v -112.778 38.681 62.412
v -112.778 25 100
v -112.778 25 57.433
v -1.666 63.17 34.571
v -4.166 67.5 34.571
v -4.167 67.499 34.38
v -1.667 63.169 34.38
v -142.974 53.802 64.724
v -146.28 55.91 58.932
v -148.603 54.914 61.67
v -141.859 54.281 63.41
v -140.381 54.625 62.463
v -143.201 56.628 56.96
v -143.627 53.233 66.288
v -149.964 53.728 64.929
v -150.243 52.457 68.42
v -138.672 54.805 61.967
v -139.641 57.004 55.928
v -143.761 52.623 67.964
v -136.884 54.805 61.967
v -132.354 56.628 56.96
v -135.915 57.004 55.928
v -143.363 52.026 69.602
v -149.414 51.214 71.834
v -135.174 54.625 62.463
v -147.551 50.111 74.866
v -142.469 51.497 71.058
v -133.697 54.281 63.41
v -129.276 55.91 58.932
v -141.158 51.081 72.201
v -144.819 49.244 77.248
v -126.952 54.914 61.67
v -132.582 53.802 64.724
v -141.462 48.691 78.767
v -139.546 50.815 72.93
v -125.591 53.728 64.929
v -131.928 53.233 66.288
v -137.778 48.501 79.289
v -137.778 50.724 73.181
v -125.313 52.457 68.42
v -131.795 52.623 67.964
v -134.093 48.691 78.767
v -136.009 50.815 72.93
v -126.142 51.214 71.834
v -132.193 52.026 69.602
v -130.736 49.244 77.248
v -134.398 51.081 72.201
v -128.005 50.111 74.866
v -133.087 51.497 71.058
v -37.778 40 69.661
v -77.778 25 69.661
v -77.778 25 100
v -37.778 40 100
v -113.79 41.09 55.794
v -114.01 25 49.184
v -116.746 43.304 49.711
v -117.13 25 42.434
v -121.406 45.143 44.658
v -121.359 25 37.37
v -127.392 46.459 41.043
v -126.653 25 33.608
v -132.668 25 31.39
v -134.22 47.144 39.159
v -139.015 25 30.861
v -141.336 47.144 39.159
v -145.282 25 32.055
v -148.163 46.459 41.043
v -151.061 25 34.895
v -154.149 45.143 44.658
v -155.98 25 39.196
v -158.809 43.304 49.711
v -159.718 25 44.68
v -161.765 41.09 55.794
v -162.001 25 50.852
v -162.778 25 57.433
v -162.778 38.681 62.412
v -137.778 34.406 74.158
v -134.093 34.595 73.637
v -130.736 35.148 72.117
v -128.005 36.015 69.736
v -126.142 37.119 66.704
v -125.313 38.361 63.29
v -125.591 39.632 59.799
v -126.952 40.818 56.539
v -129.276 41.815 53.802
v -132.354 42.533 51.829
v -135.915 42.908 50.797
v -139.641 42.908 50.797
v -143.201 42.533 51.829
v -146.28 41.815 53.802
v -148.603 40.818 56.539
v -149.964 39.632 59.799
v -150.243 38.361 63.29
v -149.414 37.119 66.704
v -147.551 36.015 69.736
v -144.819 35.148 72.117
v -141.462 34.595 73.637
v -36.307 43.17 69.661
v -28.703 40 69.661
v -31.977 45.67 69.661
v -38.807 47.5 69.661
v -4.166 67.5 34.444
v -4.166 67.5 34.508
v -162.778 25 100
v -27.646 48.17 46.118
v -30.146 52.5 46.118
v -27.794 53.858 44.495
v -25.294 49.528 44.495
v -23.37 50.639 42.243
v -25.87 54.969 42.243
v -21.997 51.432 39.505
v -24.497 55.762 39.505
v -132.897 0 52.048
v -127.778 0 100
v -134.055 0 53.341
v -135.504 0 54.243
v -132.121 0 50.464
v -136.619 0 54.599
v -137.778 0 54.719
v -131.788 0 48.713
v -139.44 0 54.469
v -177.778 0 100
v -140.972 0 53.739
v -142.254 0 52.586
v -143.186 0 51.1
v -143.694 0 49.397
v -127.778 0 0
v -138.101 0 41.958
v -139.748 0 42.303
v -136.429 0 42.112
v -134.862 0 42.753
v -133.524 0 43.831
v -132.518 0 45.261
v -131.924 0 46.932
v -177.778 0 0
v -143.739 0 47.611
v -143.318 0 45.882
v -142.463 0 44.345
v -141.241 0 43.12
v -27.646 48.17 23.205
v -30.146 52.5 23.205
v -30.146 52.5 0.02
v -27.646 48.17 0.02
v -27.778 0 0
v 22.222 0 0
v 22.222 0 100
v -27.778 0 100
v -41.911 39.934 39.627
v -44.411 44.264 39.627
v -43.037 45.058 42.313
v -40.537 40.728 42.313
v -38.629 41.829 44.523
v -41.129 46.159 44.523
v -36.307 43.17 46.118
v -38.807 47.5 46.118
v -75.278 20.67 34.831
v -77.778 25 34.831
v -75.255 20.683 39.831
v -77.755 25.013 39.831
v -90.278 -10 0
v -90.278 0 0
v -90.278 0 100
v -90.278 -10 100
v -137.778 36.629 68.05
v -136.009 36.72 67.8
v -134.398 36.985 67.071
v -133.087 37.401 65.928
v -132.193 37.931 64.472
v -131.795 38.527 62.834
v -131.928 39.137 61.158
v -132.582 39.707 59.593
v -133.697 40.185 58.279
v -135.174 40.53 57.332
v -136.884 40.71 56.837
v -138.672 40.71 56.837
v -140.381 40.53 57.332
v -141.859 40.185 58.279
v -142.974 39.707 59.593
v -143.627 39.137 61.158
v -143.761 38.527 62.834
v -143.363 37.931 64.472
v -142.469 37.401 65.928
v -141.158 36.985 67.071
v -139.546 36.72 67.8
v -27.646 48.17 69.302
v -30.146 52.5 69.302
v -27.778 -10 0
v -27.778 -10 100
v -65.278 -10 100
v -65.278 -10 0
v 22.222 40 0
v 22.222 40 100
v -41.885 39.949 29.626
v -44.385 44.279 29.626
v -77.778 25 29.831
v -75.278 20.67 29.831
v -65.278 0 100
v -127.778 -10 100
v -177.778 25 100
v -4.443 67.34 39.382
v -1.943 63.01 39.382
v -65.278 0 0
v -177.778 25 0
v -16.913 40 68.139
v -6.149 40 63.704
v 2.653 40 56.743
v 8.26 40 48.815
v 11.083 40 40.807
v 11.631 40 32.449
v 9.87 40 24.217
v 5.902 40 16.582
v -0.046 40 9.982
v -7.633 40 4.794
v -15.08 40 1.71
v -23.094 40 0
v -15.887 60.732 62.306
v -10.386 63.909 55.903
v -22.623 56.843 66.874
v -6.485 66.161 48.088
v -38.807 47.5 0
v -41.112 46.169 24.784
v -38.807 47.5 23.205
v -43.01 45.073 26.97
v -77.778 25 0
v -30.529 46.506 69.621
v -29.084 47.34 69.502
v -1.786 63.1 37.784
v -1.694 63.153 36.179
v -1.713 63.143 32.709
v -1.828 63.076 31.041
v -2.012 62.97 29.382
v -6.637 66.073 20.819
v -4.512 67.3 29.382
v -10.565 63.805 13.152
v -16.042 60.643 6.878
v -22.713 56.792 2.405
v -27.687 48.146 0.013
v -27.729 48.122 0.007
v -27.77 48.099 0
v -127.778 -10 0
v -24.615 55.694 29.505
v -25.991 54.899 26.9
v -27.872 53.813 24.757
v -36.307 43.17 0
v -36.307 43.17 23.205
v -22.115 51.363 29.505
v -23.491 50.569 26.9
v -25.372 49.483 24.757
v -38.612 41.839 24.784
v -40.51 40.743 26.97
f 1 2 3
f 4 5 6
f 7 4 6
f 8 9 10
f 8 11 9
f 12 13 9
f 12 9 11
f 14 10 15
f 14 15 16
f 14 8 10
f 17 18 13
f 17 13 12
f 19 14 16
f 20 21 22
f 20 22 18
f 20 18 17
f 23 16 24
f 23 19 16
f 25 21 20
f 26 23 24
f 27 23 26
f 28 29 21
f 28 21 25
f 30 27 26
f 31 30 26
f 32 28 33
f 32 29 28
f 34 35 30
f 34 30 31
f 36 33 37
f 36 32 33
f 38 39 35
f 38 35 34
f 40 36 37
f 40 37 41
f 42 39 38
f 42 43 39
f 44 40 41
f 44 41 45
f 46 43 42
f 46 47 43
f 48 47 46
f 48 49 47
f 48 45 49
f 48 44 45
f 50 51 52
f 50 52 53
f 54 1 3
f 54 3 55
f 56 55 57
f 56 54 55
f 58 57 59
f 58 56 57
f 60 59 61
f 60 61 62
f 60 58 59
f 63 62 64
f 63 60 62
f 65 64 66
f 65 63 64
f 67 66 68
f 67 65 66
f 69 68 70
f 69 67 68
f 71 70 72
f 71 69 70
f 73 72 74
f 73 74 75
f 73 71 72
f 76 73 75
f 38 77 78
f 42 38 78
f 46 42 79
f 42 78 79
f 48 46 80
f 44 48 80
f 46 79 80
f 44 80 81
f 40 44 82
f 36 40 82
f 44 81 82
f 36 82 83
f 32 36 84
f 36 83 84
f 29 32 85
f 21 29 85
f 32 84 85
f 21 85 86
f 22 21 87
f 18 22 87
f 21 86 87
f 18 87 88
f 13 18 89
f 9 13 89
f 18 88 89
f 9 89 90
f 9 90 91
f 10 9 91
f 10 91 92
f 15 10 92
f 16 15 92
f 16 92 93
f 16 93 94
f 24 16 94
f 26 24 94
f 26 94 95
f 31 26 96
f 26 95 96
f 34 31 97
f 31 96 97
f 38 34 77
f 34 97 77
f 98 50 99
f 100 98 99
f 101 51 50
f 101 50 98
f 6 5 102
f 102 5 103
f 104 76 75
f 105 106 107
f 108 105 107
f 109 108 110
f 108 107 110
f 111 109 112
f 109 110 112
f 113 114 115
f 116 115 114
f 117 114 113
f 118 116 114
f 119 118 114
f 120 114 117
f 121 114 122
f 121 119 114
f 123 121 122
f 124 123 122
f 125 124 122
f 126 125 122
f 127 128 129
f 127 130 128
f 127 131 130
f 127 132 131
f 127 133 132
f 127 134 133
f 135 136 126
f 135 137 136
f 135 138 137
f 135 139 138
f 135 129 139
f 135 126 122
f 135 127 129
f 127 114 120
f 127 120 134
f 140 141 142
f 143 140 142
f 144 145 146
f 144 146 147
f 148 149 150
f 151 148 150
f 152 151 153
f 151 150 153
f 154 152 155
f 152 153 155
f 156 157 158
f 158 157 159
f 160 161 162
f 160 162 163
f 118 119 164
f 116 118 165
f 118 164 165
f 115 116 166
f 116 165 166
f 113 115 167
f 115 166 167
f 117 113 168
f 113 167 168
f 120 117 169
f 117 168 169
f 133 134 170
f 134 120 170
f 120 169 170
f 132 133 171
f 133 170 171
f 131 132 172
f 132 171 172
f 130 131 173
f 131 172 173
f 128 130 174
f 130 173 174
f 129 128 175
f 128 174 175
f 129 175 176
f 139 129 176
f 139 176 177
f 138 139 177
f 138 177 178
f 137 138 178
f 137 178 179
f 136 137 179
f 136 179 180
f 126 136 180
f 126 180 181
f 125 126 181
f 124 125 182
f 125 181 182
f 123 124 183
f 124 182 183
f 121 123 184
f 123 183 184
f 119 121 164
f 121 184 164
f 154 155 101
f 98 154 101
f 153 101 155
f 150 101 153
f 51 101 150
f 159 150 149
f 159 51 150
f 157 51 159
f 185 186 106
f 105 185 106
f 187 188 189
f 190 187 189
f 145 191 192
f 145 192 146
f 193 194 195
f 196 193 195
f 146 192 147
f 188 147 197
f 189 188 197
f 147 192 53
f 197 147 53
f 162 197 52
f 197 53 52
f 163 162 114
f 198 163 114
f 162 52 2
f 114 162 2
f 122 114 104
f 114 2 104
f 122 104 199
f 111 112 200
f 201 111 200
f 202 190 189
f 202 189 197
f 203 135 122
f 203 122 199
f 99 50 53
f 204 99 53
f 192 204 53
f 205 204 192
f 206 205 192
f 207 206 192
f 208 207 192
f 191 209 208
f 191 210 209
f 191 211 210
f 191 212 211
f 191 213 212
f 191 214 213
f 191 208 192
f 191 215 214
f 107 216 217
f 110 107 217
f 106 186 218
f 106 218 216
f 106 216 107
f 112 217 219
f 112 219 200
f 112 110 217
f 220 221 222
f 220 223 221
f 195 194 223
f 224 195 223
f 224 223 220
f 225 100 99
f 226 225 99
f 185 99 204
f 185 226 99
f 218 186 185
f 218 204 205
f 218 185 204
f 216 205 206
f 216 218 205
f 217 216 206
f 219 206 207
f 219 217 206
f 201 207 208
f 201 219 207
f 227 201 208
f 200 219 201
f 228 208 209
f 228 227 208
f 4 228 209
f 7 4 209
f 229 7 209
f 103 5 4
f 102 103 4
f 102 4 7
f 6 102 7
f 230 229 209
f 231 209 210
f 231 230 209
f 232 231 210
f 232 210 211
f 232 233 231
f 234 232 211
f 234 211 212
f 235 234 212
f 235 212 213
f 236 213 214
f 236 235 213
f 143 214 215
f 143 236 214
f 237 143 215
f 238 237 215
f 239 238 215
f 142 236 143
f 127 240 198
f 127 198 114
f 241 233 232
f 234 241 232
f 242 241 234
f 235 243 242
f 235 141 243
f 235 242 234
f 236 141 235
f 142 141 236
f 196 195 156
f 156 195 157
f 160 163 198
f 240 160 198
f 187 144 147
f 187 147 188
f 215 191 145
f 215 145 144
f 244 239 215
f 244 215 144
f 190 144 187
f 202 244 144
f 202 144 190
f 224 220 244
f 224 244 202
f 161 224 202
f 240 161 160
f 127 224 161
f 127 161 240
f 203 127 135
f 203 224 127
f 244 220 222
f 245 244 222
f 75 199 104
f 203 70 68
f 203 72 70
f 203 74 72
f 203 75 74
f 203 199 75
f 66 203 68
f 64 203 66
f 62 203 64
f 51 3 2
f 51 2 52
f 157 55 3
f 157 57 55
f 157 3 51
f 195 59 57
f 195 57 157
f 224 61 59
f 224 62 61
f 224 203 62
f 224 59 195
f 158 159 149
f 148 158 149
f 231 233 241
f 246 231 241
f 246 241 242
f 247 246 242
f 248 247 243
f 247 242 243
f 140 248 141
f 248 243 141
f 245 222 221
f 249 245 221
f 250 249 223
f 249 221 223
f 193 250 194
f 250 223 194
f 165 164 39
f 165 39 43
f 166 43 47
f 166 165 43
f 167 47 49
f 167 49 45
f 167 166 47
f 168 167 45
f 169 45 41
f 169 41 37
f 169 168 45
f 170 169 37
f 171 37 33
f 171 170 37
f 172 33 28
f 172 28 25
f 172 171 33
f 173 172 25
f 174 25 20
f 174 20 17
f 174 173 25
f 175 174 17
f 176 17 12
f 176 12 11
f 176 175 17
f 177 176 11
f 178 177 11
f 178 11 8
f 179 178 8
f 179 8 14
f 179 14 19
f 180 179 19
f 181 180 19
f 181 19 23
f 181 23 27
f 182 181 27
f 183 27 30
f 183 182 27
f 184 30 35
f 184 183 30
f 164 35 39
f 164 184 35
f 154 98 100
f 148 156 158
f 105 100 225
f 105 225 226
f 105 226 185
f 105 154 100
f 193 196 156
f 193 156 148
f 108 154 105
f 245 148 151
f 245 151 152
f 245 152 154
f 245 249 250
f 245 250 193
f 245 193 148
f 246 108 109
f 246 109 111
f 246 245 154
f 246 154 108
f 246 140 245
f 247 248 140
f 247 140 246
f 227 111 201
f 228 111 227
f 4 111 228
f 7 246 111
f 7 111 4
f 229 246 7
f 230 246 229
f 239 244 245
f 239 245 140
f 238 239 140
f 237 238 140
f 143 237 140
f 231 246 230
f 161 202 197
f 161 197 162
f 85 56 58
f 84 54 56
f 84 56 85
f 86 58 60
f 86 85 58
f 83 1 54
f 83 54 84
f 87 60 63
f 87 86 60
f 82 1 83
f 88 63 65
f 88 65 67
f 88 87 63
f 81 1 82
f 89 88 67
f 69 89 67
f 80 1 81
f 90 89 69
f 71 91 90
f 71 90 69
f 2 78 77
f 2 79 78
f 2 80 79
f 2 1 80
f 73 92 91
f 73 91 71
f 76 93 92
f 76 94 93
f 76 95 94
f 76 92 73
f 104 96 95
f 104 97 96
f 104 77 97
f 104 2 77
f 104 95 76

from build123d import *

# Parameters (mm, degrees)
BOSS_EXTRUDE1_DEPTH  = 100
BOSS_EXTRUDE2_REACH  = 207.357
SKETCH6_R            = 12.5
SKETCH6_R_2          = 6
BOSS_EXTRUDE4_DEPTH  = 15
SKETCH7_R            = 6
CUT_EXTRUDE3_DEPTH   = 206.356636358
BOSS_EXTRUDE10_REACH = 190.828
CUT_EXTRUDE6_DEPTH   = 5


with BuildPart() as part:
    # Sketch1 → Boss-Extrude1 (new body)
    with BuildSketch(Plane.XY):
        Polygon((-177.777777778, 0), (-177.777777778, 25), (-77.777777778, 25), (-37.777777778, 40), (22.222222222, 40), (22.222222222, 0), (-27.777777778, 0), (-27.777777778, -10), (-65.277777778, -10), (-65.277777778, 0), (-90.277777778, 0), (-90.277777778, -10), (-127.777777778, -10), (-127.777777778, 0), align=None)
    extrude(amount=BOSS_EXTRUDE1_DEPTH)

    # Sketch5 → Boss-Extrude2 (add, up to next)
    with BuildSketch(Plane(origin=(0, 54.214936023, 19.732622965), x_dir=(-1, 0, 0), z_dir=(0, 0.939692620785908, 0.34202014332566977)), mode=Mode.PRIVATE) as boss_extrude2_sk1:
        with BuildLine():
            Line((112.777777778, 85.418758495), (112.777777778, 45.418758495))
            ThreePointArc((112.777777778, 45.418758495), (137.777777778, 20.418758495), (162.777777778, 45.418758495))
            Line((162.777777778, 45.418758495), (162.777777778, 85.418758495))
            Line((162.777777778, 85.418758495), (112.777777778, 85.418758495))
        make_face()
    boss_extrude2_tool1 = extrude(boss_extrude2_sk1.sketch, amount=-BOSS_EXTRUDE2_REACH, mode=Mode.PRIVATE) - part.part
    add(boss_extrude2_tool1.solids().sort_by_distance((-137.777778, 35.287462, 71.735431))[0])

    # Sketch6 → Boss-Extrude4 (add)
    with BuildSketch(Plane(origin=(0, 54.214936023, 19.732622965), x_dir=(1, 0, 0), z_dir=(0, 0.9396926207859081, 0.3420201433256699))):
        with Locations(Location((-137.777777778, -45.418758495, 0), (0, 0, 270))):
            Circle(SKETCH6_R)
        with Locations(Location((-137.777777778, -45.418758495, 0), (0, 0, 270))):
            Circle(SKETCH6_R_2, mode=Mode.SUBTRACT)
    extrude(amount=BOSS_EXTRUDE4_DEPTH)

    # Sketch7 → Cut-Extrude3 (cut, through all)
    with BuildSketch(Plane(origin=(0, 54.214936023, 19.732622965), x_dir=(1, 0, 0), z_dir=(0, 0.9396926207859081, 0.3420201433256699))):
        with Locations(Location((-137.777777778, -45.418758495, 0), (0, 0, 270))):
            Circle(SKETCH7_R)
    extrude(amount=-CUT_EXTRUDE3_DEPTH, mode=Mode.SUBTRACT)

    # Sketch10 → Boss-Extrude10 (add, up to next)
    with BuildSketch(Plane(origin=(-30.269761992, 52.428765703, 0), x_dir=(0, 0, -1), z_dir=(-0.5000000000000012, 0.8660254037844379, 0)), mode=Mode.PRIVATE) as boss_extrude10_sk1:
        with BuildLine():
            Line((-69.661280828, 54.857531405), (-69.661280828, 4.857531405))
            ThreePointArc((-69.661280828, 4.857531405), (-37.095944154, -30.057686115), (0, 0))
            Line((0, 0), (0, 54.857531405))
            Line((0, 54.857531405), (-69.661280828, 54.857531405))
        make_face()
    boss_extrude10_tool1 = extrude(boss_extrude10_sk1.sketch, amount=-BOSS_EXTRUDE10_REACH, mode=Mode.PRIVATE) - part.part
    add(boss_extrude10_tool1.solids().sort_by_distance((-43.846947, 44.589974, 34.777462))[0])

    # Sketch11 → Cut-Extrude6 (cut)
    with BuildSketch(Plane(origin=(-30.269761992, 52.428765703, 0), x_dir=(0.866025403784438, 0.5000000000000012, 0), z_dir=(-0.5000000000000011, 0.8660254037844379, 0))):
        with BuildLine():
            Line((-54.857531405, -34.830640414), (-54.831038967, -39.830570229))
            Line((-54.831038967, -39.830570229), (-16.329059293, -39.626565102))
            ThreePointArc((-16.329059293, -39.626565102), (-13.709739092, -43.486722407), (-9.857531405, -46.117720065))
            Line((-9.857531405, -46.117720065), (-9.857531405, -69.661280828))
            Line((-9.857531405, -69.661280828), (-4.857531405, -69.661280828))
            ThreePointArc((-4.857531405, -69.661280828), (-2.351096218, -69.571419508), (0.142468595, -69.302296979))
            Line((0.142468595, -69.302296979), (0.142468595, -46.117720065))
            ThreePointArc((0.142468595, -46.117720065), (4.041313515, -43.439695211), (6.665968636, -39.50472452))
            Line((6.665968636, -39.50472452), (29.822643788, -39.382027441))
            ThreePointArc((29.822643788, -39.382027441), (30.065429756, -36.982225405), (30.142353187, -34.571400312))
            Line((30.142353187, -34.571400312), (30.141340464, -34.380268592))
            ThreePointArc((30.141340464, -34.380268592), (30.031317876, -31.874132501), (29.742071325, -29.382313987))
            Line((29.742071325, -29.382313987), (6.529563607, -29.505306898))
            ThreePointArc((6.529563607, -29.505306898), (3.92074784, -25.762302601), (0.142468595, -23.204841591))
            Line((0.142468595, -23.204841591), (0.142468595, -0.020264677))
            ThreePointArc((0.142468595, -0.020264677), (0.071244712, -0.010059118), (0, 0))
            Line((0, 0), (-9.857531405, 0))
            Line((-9.857531405, 0), (-9.857531405, -23.204841591))
            ThreePointArc((-9.857531405, -23.204841591), (-13.682838556, -25.808939121), (-16.298624018, -29.626263466))
            Line((-16.298624018, -29.626263466), (-54.857531405, -29.830570228))
            Line((-54.857531405, -29.830570228), (-54.857531405, -34.830640414))
        make_face()
    extrude(amount=-CUT_EXTRUDE6_DEPTH, mode=Mode.SUBTRACT)


solid = part.part
